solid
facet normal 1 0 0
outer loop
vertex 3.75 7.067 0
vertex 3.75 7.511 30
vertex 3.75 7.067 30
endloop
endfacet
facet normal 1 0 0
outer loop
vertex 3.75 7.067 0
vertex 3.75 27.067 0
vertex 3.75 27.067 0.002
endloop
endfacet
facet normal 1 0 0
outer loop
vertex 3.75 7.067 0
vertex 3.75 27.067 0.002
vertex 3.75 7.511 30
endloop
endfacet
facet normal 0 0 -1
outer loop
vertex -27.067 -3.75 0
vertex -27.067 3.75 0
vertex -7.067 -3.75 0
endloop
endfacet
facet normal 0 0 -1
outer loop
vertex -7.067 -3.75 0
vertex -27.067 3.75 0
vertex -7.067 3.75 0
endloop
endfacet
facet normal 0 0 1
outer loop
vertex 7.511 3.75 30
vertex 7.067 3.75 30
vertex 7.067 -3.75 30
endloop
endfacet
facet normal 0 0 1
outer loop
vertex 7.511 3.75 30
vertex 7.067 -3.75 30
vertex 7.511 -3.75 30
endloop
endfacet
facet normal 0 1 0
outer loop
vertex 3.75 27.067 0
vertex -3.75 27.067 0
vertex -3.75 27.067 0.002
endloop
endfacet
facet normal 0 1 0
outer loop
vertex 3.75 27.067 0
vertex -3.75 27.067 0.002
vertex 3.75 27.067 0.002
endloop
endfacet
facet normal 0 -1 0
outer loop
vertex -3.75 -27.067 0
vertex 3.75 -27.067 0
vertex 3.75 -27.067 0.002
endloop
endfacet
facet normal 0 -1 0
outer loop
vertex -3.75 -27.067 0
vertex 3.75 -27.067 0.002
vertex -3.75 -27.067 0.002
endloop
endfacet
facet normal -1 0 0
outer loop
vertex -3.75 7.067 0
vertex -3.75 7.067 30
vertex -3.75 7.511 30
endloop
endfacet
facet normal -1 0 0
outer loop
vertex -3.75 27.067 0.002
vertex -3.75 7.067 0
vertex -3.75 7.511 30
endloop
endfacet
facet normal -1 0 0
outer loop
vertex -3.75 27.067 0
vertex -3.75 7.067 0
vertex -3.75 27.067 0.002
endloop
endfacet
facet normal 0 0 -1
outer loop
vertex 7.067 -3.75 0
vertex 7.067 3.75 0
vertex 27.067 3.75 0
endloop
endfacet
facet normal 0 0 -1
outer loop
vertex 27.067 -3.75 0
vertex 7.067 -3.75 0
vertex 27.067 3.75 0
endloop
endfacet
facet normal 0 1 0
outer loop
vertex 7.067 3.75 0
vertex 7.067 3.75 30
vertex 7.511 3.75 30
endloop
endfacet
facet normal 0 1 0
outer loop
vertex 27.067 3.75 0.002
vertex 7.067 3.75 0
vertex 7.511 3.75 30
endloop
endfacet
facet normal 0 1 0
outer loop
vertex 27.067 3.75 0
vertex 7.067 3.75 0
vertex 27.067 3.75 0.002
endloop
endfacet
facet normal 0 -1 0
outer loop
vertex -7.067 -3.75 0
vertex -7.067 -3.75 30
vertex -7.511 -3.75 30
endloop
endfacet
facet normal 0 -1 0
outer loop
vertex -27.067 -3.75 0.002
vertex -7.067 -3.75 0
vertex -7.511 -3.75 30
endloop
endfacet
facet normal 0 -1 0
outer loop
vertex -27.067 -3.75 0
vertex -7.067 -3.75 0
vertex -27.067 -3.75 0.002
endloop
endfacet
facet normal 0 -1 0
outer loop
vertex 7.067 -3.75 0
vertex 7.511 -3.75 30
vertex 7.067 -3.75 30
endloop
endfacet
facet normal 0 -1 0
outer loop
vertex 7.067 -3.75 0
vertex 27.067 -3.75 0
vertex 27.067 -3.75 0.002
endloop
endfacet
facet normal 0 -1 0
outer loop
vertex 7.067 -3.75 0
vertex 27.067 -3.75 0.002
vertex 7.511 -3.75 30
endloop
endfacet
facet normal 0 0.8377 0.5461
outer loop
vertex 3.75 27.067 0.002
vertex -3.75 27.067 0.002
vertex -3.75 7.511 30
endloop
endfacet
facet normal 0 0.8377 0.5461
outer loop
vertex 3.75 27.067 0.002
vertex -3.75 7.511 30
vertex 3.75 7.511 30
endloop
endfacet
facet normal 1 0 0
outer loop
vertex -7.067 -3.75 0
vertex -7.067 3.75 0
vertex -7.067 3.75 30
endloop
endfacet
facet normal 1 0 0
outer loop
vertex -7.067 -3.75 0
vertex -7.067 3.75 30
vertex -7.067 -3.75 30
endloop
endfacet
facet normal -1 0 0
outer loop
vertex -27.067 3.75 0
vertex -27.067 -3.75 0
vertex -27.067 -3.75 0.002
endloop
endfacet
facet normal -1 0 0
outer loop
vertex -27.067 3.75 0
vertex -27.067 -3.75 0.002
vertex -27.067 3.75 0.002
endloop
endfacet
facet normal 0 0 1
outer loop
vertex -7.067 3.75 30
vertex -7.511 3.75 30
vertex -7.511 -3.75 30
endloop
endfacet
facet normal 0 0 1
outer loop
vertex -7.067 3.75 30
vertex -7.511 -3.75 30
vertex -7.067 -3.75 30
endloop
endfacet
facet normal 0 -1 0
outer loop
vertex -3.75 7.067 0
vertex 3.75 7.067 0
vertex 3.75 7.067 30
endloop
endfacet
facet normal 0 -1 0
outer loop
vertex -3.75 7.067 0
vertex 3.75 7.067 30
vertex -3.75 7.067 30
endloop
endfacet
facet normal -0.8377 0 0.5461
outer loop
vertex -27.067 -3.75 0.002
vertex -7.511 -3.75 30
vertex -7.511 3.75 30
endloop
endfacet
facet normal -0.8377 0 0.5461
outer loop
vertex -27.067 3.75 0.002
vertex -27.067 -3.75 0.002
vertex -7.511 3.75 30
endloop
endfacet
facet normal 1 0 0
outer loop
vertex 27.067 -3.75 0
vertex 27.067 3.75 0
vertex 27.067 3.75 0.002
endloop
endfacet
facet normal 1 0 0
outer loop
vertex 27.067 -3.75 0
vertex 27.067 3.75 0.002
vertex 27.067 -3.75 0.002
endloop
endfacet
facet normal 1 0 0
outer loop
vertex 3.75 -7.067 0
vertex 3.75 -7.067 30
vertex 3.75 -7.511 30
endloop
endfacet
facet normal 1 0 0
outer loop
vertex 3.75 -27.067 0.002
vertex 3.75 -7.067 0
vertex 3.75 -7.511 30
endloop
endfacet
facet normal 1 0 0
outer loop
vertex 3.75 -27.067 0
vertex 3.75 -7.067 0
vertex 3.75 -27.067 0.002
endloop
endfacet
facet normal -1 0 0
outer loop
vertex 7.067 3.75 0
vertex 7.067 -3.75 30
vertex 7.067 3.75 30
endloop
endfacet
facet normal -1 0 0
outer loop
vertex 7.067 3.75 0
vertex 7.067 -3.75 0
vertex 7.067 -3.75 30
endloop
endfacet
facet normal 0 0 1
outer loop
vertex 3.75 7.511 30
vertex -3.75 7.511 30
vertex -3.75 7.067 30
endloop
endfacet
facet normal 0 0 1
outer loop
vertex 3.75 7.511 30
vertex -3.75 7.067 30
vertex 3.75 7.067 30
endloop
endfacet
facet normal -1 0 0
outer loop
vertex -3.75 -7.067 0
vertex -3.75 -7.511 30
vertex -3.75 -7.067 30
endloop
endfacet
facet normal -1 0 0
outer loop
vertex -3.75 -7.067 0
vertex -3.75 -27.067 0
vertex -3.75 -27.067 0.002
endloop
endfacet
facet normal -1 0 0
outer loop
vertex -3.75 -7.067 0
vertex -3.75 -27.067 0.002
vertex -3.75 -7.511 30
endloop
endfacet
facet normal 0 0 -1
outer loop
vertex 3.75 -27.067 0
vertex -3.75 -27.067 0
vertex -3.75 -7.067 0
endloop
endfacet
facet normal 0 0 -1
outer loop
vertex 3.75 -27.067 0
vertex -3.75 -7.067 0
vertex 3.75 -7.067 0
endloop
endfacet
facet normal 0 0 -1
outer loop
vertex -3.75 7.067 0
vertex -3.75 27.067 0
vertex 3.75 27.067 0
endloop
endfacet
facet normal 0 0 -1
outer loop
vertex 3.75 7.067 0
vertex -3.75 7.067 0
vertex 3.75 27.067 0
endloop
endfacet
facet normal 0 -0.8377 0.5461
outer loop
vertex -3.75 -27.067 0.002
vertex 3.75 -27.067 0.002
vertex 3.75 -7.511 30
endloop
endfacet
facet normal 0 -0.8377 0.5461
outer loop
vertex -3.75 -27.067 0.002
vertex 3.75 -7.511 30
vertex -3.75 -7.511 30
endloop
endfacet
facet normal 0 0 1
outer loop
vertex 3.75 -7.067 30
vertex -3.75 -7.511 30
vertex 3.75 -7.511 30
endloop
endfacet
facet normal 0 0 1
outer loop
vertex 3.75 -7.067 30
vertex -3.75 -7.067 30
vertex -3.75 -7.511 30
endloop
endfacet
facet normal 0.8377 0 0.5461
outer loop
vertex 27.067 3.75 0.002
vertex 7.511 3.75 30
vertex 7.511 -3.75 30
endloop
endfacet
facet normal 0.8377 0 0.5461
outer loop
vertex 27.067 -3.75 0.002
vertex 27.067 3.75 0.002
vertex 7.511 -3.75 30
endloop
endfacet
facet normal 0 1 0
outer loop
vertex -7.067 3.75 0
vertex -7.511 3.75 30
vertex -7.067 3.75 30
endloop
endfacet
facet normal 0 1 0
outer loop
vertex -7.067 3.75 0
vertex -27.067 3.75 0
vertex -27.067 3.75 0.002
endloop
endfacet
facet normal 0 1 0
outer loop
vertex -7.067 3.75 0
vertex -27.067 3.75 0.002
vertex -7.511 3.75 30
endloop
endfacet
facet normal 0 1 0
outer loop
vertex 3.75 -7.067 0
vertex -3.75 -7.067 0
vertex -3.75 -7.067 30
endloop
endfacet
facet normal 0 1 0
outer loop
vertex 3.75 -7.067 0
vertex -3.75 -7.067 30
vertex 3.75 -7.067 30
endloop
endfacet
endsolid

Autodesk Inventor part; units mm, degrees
ref_plane "YZ Plane" through (0, 0, 0) normal (1, 0, 0) x (0, 1, 0)
ref_plane "XZ Plane" through (0, 0, 0) normal (0, 1, 0) x (-1, 0, 0)
ref_plane "XY Plane" through (0, 0, 0) normal (0, 0, 1) x (1, 0, 0)
sketch "Sketch1" plane through (0, 0, 0) normal (0, 0, 1) x (1, 0, 0)
  line L0 (40, 40) -> (40, -40) projected
  line L1 (-40, 40) -> (40, 40) projected
  line L2 (-40, -40) -> (-40, 40) projected
  line L3 (40, -40) -> (-40, -40) projected
  circle A0 centre (35, 35) radius 1.65 projected
  circle A1 centre (35, -35) radius 1.65 projected
  circle A2 centre (-35, -35) radius 1.65 projected
  circle A3 centre (-35, 35) radius 1.65 projected
  line L4 (0, -56) -> (0, 56)
  circle A4 centre (0, 0) radius 8 projected
  line L5 (-3.75, 27.0666) -> (3.75, 27.0666)
  line L6 (3.75, 27.0666) -> (3.75, 7.0666)
  line L7 (3.75, 7.0666) -> (-3.75, 7.0666)
  line L8 (-3.75, 7.0666) -> (-3.75, 27.0666)
  line L9 (-3.75, -7.0666) -> (3.75, -7.0666)
  line L10 (3.75, -7.0666) -> (3.75, -27.0666)
  line L11 (3.75, -27.0666) -> (-3.75, -27.0666)
  line L12 (-3.75, -27.0666) -> (-3.75, -7.0666)
  line L13 (-27.0666, 3.75) -> (-7.0666, 3.75)
  line L14 (-7.0666, 3.75) -> (-7.0666, -3.75)
  line L15 (-7.0666, -3.75) -> (-27.0666, -3.75)
  line L16 (-27.0666, -3.75) -> (-27.0666, 3.75)
  line L17 (7.0666, 3.75) -> (27.0666, 3.75)
  line L18 (27.0666, 3.75) -> (27.0666, -3.75)
  line L19 (27.0666, -3.75) -> (7.0666, -3.75)
  line L20 (7.0666, -3.75) -> (7.0666, 3.75)
  line L21 (-56, 0) -> (56, 0)
  point P0 (0, 0)
  dimension "d0" = 20
  dimension "d1" = 7.5
  dimension "d2" = 3.75
  dimension "d3" = 20
  dimension "d4" = 7.5
  dimension "d9" = 3.75
  dimension "d10" = 7.5
  dimension "d11" = 20
  dimension "d12" = 20
  dimension "d13" = 7.5
  dimension "d14" = 3.75
extrude "Extrusion1" add sketch "Sketch1" along normal blind 30 contours L21 A4 L17 L18 | L18 L19 A4 L21 | L5 L6 A4 L4 | L4 A4 L8 L5 | L21 L20 A4 | A4 L20 L21 | A4 L7 L4 | L4 L7 A4 | L11 L12 A4 L4 | L4 A4 L10 L11 | L21 A4 L15 L16 | L16 L13 A4 L21 | A4 L9 L4 | L4 L9 A4 | L21 L14 A4 | A4 L14 L21
chamfer "Chamfer1" distance 19.5555 angle 56.9 1 edges at (0, 27.0666, 30) measured on face at (-1.25, 20.4, 30)
chamfer "Chamfer2" distance 19.5555 angle 56.9 1 edges at (27.0666, 0, 30) measured on face at (13.7333, 1.25, 30)
chamfer "Chamfer3" distance 19.5555 angle 56.9 1 edges at (-27.0666, 0, 30) measured on face at (-20.4, 1.25, 30)
chamfer "Chamfer4" distance 19.5555 angle 56.9 1 edges at (0, -27.0666, 30) measured on face at (-1.25, -13.7333, 30)
equation "\"d2\" = 0.5 * d1"
equation "\"d3\" = d0"
equation "\"d4\" = d1"
equation "\"d9\" = d2"
equation "\"d10\" = d1"
equation "\"d11\" = d0"
equation "\"d12\" = d0"
equation "\"d13\" = d1"
equation "\"d14\" = d2"
properties part number "pilling"
